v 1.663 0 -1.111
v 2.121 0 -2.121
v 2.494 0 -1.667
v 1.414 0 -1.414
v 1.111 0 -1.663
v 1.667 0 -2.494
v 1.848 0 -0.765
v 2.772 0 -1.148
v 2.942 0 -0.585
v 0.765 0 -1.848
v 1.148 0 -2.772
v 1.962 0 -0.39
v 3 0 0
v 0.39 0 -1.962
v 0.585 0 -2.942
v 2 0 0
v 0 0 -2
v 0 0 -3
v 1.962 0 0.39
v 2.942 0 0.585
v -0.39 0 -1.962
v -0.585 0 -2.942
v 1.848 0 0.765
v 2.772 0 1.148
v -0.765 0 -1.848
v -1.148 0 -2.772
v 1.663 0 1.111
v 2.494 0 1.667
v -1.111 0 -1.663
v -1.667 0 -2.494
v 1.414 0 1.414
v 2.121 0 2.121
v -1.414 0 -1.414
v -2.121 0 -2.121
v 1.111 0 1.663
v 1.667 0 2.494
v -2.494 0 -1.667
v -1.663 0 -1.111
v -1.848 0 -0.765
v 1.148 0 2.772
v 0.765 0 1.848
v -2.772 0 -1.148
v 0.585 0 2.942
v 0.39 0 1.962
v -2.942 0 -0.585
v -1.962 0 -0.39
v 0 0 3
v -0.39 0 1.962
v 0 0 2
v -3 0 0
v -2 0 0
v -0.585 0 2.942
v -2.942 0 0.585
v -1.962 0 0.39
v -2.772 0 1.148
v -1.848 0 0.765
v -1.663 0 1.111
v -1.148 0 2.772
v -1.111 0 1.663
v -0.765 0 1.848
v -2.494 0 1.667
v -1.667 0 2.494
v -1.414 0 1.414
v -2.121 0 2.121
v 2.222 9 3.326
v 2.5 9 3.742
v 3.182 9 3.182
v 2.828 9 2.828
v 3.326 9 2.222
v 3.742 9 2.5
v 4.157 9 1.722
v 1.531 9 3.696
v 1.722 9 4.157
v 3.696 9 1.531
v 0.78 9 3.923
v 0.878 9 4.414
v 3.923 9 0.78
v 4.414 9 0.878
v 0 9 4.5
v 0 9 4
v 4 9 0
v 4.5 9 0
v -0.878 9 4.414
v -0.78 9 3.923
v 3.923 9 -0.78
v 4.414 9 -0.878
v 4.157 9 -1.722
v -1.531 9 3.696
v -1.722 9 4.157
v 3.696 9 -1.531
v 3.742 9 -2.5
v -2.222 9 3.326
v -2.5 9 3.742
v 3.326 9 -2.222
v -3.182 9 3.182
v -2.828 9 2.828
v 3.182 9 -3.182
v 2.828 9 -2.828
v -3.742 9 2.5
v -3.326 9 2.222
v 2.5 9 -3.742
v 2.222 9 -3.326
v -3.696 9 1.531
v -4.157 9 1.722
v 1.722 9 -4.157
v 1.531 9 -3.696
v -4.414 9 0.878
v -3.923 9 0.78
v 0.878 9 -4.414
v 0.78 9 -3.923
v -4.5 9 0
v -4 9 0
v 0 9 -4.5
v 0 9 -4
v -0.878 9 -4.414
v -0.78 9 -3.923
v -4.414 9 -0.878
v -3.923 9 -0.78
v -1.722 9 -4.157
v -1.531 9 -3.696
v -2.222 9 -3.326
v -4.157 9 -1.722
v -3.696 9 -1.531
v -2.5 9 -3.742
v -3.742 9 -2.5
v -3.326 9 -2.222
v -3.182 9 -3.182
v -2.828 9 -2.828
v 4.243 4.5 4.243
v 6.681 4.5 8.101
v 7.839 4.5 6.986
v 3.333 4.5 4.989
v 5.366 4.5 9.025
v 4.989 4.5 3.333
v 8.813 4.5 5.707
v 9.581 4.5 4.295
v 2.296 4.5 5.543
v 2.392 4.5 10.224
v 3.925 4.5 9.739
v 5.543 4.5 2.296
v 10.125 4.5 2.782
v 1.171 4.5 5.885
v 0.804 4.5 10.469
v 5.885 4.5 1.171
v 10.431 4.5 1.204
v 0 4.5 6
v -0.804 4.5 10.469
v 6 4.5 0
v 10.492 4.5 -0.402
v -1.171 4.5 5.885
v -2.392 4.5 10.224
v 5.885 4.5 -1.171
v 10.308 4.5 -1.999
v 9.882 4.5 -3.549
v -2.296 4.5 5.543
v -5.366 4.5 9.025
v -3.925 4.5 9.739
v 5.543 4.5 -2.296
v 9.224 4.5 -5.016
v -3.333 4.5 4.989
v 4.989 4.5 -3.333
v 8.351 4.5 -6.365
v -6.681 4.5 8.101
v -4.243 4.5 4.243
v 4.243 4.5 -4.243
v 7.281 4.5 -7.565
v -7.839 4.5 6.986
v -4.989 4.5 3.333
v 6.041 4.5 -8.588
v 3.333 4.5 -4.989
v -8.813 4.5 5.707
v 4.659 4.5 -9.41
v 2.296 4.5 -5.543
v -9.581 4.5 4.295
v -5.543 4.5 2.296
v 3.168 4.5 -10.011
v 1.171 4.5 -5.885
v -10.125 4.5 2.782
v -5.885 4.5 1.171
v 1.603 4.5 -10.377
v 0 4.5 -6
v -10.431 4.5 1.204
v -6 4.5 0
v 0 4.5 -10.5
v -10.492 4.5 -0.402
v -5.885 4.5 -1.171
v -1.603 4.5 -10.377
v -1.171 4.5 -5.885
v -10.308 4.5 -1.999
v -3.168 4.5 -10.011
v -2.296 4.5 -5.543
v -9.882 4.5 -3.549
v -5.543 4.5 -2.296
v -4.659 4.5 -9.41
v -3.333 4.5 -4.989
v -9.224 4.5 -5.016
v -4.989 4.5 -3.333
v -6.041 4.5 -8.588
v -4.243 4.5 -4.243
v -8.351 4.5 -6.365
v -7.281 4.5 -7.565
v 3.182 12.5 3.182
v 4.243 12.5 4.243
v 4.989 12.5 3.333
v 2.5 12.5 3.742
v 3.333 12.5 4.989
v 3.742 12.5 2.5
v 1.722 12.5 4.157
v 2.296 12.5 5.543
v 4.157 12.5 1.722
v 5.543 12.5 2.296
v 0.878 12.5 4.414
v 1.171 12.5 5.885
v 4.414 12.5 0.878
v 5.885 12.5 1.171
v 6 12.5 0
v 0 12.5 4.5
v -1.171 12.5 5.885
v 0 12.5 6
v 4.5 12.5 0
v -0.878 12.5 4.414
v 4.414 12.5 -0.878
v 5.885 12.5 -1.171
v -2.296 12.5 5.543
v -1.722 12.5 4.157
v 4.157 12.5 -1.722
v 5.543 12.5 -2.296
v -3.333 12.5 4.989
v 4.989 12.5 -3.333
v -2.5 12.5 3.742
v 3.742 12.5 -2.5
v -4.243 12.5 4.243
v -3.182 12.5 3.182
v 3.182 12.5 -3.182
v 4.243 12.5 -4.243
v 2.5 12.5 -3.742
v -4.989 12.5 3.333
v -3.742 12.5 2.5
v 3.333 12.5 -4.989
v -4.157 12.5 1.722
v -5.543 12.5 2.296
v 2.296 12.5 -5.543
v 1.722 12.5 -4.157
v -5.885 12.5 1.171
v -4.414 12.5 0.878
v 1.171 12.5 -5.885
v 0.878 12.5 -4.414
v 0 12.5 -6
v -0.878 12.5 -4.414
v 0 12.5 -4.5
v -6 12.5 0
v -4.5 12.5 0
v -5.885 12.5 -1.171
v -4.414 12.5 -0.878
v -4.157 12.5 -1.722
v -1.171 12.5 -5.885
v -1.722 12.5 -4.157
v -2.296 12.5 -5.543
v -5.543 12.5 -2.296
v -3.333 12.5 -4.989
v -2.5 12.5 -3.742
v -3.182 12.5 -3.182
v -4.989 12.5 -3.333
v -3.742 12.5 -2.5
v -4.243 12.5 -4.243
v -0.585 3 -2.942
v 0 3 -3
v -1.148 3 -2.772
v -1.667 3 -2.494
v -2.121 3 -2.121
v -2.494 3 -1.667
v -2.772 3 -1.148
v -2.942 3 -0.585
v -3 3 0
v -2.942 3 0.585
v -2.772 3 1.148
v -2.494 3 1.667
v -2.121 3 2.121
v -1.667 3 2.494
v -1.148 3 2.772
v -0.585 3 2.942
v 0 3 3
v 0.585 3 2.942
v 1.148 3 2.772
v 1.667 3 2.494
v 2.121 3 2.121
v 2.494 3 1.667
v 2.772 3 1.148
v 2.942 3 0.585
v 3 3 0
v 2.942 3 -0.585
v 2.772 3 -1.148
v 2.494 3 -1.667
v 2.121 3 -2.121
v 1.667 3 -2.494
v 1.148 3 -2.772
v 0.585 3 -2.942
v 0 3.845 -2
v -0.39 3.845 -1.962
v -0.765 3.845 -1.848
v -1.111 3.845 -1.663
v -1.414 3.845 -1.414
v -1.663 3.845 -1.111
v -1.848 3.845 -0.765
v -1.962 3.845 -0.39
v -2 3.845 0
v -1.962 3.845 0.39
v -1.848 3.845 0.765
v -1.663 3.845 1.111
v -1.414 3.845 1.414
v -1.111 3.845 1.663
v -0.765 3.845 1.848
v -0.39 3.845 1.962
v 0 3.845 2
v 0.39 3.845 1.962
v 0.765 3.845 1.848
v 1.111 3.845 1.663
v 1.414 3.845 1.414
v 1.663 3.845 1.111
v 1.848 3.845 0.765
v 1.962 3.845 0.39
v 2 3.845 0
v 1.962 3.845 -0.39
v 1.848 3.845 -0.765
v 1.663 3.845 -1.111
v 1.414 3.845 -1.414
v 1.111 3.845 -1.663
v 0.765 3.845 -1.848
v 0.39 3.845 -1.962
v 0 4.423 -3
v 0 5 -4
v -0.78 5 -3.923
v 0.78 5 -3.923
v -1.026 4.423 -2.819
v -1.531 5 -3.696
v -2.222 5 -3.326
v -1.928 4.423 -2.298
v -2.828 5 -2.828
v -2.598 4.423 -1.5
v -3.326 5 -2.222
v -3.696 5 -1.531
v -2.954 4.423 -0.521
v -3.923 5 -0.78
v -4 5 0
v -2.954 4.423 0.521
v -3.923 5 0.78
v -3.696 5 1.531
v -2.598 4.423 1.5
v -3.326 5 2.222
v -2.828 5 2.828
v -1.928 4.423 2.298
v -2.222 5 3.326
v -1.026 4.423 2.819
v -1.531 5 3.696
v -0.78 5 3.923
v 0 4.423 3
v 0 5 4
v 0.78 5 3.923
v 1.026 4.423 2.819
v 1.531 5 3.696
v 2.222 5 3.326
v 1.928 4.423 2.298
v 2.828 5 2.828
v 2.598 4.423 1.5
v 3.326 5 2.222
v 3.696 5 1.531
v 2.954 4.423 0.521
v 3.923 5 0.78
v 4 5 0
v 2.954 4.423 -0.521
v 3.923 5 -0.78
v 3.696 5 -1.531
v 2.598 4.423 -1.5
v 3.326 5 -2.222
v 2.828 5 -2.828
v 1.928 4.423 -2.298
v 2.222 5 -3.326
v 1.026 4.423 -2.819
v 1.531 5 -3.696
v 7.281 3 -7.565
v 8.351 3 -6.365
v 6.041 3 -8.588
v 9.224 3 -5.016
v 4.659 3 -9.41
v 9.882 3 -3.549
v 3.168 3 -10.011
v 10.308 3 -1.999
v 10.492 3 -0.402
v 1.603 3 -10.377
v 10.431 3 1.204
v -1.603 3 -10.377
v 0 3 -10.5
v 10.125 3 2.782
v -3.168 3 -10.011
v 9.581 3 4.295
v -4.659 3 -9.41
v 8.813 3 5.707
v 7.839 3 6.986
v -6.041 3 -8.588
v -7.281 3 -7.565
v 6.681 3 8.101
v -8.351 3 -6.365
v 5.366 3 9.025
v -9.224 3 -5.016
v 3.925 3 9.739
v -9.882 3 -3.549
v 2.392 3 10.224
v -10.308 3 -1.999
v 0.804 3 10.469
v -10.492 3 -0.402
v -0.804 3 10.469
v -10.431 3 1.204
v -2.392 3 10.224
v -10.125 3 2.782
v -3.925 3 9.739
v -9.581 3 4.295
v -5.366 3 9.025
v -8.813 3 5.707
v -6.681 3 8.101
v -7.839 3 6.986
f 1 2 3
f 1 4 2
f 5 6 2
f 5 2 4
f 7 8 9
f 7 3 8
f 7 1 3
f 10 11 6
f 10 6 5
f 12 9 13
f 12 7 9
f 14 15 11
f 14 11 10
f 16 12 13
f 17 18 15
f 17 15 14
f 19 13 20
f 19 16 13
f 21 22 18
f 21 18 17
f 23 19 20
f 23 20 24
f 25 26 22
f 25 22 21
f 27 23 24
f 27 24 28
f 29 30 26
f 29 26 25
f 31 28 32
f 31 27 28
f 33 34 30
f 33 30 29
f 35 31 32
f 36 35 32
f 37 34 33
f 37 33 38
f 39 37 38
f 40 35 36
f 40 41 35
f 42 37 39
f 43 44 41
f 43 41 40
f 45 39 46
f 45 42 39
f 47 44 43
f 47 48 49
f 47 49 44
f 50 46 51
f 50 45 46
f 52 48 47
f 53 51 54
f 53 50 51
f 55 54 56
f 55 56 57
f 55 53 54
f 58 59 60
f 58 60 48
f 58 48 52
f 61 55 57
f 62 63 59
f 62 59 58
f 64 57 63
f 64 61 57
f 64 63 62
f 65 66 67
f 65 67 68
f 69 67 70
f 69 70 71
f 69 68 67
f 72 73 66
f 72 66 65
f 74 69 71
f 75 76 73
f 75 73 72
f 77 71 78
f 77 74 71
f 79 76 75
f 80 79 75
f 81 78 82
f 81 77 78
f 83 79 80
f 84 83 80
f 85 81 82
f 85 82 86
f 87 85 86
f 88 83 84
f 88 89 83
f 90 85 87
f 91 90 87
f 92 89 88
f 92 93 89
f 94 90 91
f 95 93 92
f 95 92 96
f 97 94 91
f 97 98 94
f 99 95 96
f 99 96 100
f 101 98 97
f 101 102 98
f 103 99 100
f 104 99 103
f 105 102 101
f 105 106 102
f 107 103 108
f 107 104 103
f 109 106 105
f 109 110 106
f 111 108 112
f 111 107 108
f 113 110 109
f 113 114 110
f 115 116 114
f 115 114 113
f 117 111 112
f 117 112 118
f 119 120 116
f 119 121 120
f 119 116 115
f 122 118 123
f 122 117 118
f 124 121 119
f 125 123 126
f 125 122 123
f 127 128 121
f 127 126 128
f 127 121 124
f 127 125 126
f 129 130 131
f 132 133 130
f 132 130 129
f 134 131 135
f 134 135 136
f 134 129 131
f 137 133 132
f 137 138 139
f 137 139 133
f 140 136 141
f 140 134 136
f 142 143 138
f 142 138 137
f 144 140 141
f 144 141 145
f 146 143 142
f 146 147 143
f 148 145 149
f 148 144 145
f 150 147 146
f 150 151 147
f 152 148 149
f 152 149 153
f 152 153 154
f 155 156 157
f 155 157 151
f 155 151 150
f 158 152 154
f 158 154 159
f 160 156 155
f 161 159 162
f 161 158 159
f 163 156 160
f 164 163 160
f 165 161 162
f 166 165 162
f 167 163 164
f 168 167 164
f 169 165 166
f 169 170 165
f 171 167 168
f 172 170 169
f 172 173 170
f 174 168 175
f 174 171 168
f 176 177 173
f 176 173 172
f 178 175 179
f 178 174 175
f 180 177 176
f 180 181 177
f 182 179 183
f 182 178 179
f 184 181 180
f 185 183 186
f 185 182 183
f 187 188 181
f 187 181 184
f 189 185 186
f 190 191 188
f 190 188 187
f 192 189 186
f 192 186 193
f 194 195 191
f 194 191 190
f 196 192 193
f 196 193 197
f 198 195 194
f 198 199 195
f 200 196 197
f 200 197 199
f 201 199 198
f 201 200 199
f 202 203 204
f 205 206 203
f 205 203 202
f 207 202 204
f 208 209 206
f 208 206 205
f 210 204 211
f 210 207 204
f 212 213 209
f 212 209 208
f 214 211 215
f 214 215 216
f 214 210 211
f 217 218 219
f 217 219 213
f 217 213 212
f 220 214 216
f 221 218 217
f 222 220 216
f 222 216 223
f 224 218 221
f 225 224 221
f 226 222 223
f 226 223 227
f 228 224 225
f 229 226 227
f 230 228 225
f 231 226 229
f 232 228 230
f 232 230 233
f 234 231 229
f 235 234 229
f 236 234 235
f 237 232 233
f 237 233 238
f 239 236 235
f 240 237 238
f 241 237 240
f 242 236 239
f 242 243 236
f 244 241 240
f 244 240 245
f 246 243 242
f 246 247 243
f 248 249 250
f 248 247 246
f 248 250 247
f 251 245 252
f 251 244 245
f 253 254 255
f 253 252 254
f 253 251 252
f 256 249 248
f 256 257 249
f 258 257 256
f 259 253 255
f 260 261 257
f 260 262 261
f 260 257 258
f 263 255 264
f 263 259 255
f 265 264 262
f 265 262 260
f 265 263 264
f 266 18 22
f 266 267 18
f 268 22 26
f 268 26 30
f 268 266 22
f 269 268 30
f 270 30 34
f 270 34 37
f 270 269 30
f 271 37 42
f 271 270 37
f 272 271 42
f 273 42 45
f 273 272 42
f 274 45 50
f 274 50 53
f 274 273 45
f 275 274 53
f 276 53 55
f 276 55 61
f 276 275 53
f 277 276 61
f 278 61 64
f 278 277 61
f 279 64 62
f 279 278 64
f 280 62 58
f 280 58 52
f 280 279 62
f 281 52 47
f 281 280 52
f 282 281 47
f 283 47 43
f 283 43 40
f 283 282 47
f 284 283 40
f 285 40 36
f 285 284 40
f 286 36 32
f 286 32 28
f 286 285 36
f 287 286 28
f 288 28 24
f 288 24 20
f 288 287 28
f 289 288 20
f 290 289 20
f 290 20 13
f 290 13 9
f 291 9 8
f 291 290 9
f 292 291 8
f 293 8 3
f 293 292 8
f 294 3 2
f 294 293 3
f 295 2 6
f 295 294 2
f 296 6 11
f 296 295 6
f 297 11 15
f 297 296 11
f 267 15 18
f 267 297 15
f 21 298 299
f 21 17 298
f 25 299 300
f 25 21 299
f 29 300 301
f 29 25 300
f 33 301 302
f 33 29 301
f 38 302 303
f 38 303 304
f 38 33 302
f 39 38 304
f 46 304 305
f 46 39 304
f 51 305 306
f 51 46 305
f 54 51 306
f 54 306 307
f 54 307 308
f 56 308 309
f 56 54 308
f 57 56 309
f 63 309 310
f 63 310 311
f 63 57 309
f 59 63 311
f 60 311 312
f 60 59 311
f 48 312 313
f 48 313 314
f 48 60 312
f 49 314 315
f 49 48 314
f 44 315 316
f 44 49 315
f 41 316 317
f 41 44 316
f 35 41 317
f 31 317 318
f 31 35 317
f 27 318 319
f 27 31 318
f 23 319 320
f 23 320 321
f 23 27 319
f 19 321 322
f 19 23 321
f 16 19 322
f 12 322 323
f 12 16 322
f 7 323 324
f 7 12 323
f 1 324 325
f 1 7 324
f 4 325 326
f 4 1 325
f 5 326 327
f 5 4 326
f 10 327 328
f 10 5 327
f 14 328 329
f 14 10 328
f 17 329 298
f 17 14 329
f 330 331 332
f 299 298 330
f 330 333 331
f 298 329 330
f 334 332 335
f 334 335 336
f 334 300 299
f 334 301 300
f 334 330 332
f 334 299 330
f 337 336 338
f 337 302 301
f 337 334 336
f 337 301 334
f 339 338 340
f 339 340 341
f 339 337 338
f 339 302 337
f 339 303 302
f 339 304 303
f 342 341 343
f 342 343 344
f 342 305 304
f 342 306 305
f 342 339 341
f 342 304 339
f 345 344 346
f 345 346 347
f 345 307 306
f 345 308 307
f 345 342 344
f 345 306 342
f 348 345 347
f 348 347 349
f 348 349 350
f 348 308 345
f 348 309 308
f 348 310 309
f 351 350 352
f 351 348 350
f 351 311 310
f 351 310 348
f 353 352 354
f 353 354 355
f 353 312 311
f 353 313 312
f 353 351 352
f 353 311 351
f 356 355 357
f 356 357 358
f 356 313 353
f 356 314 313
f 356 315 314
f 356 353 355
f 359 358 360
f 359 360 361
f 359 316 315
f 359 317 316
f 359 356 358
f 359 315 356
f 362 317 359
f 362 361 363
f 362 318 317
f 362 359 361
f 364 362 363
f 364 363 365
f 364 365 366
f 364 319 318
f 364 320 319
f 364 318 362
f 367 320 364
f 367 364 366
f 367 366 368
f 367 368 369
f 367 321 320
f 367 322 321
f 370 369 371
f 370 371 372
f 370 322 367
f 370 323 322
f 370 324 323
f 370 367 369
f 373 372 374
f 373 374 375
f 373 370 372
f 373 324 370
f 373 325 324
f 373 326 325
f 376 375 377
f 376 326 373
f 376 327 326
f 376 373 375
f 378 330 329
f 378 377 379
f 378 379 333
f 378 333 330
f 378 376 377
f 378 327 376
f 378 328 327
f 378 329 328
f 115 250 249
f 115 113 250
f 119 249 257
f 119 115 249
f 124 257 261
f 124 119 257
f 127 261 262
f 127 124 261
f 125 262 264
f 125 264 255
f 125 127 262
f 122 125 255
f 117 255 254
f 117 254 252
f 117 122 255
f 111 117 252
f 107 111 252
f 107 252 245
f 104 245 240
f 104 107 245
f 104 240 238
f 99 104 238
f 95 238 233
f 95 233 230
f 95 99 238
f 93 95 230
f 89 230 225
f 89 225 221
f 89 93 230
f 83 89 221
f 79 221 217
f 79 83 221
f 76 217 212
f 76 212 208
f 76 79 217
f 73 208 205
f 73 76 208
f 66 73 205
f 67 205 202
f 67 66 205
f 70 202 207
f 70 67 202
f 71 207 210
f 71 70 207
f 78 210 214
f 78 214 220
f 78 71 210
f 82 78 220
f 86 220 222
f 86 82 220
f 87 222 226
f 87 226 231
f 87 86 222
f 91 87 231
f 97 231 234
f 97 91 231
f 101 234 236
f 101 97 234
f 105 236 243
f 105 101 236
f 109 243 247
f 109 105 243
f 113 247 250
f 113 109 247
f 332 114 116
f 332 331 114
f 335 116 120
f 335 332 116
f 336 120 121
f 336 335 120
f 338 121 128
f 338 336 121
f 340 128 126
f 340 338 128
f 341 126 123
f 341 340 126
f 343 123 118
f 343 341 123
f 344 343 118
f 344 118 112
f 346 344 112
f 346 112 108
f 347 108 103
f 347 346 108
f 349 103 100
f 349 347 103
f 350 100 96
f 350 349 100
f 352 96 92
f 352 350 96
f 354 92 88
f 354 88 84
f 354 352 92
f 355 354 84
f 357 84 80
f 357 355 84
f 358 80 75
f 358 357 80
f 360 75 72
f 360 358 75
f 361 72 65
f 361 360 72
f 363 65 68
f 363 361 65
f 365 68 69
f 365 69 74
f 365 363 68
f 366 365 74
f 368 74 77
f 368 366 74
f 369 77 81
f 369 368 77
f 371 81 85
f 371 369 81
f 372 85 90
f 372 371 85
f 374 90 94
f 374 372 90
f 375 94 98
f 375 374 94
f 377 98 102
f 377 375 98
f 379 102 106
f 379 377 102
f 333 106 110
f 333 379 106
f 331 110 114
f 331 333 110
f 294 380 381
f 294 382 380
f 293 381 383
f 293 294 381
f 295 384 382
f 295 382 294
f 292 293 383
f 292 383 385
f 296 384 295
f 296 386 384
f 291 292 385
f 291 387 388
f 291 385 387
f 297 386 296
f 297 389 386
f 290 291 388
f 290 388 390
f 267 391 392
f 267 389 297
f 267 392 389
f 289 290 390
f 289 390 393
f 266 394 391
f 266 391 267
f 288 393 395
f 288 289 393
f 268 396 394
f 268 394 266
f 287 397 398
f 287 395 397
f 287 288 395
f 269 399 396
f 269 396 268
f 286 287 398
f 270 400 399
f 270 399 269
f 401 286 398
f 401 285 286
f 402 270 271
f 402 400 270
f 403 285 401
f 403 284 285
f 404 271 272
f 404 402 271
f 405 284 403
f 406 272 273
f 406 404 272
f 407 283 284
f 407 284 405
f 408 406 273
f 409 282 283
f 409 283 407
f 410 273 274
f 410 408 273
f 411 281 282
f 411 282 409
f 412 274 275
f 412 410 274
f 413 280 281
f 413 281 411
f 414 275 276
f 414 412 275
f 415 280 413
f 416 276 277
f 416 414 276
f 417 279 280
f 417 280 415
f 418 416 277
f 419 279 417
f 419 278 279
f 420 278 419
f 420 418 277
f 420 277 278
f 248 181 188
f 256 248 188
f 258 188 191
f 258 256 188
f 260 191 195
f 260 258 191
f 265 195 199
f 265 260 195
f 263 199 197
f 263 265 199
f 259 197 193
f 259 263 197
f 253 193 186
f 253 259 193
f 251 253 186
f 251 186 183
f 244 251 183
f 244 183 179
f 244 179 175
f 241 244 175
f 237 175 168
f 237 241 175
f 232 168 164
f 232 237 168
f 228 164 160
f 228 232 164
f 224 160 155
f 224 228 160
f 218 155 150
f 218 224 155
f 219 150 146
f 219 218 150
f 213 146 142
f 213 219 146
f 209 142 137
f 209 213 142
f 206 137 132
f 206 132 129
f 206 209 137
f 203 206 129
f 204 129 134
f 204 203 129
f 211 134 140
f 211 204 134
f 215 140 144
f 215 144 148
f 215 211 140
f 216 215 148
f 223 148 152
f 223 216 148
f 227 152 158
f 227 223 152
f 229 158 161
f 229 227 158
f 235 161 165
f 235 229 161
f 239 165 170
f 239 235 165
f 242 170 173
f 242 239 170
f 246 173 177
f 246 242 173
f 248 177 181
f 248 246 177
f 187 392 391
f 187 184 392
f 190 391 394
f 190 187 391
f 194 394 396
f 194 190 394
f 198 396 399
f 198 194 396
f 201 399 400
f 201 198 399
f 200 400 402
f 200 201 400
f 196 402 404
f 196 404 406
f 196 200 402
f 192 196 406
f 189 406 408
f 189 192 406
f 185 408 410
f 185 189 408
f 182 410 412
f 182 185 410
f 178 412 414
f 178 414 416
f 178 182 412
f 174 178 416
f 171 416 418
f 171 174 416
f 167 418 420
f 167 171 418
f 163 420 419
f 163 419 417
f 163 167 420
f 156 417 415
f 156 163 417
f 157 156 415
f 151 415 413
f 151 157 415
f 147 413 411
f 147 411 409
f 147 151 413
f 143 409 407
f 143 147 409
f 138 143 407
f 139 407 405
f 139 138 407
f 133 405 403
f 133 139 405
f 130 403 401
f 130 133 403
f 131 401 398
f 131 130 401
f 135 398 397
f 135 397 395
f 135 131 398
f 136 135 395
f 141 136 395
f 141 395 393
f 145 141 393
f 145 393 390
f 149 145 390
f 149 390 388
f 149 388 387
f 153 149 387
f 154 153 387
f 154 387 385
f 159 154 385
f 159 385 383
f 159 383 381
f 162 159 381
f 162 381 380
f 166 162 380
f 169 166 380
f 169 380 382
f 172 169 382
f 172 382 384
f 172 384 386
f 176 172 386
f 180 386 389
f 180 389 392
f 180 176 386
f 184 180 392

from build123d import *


with BuildPart() as part:
    # Esquisse1 → Révolution1 (revolve)
    with BuildSketch(Plane.XY, mode=Mode.PRIVATE) as r_volution1_sk:
        Polygon((-2, 3.845299462), (-2, 0), (-3, 0), (-3, 3), (-10.5, 3), (-10.5, 4.5), (-6, 4.5), (-6, 12.5), (-4.5, 12.5), (-4.5, 9), (-4, 9), (-4, 5), align=None)
    revolve(r_volution1_sk.sketch.rotate(Axis((0, 0, 0), (0, 1, 0)), 270), axis=Axis((0, 0, 0), (0, 1, 0)))  # turned: the seam where the file's is


solid = part.part
